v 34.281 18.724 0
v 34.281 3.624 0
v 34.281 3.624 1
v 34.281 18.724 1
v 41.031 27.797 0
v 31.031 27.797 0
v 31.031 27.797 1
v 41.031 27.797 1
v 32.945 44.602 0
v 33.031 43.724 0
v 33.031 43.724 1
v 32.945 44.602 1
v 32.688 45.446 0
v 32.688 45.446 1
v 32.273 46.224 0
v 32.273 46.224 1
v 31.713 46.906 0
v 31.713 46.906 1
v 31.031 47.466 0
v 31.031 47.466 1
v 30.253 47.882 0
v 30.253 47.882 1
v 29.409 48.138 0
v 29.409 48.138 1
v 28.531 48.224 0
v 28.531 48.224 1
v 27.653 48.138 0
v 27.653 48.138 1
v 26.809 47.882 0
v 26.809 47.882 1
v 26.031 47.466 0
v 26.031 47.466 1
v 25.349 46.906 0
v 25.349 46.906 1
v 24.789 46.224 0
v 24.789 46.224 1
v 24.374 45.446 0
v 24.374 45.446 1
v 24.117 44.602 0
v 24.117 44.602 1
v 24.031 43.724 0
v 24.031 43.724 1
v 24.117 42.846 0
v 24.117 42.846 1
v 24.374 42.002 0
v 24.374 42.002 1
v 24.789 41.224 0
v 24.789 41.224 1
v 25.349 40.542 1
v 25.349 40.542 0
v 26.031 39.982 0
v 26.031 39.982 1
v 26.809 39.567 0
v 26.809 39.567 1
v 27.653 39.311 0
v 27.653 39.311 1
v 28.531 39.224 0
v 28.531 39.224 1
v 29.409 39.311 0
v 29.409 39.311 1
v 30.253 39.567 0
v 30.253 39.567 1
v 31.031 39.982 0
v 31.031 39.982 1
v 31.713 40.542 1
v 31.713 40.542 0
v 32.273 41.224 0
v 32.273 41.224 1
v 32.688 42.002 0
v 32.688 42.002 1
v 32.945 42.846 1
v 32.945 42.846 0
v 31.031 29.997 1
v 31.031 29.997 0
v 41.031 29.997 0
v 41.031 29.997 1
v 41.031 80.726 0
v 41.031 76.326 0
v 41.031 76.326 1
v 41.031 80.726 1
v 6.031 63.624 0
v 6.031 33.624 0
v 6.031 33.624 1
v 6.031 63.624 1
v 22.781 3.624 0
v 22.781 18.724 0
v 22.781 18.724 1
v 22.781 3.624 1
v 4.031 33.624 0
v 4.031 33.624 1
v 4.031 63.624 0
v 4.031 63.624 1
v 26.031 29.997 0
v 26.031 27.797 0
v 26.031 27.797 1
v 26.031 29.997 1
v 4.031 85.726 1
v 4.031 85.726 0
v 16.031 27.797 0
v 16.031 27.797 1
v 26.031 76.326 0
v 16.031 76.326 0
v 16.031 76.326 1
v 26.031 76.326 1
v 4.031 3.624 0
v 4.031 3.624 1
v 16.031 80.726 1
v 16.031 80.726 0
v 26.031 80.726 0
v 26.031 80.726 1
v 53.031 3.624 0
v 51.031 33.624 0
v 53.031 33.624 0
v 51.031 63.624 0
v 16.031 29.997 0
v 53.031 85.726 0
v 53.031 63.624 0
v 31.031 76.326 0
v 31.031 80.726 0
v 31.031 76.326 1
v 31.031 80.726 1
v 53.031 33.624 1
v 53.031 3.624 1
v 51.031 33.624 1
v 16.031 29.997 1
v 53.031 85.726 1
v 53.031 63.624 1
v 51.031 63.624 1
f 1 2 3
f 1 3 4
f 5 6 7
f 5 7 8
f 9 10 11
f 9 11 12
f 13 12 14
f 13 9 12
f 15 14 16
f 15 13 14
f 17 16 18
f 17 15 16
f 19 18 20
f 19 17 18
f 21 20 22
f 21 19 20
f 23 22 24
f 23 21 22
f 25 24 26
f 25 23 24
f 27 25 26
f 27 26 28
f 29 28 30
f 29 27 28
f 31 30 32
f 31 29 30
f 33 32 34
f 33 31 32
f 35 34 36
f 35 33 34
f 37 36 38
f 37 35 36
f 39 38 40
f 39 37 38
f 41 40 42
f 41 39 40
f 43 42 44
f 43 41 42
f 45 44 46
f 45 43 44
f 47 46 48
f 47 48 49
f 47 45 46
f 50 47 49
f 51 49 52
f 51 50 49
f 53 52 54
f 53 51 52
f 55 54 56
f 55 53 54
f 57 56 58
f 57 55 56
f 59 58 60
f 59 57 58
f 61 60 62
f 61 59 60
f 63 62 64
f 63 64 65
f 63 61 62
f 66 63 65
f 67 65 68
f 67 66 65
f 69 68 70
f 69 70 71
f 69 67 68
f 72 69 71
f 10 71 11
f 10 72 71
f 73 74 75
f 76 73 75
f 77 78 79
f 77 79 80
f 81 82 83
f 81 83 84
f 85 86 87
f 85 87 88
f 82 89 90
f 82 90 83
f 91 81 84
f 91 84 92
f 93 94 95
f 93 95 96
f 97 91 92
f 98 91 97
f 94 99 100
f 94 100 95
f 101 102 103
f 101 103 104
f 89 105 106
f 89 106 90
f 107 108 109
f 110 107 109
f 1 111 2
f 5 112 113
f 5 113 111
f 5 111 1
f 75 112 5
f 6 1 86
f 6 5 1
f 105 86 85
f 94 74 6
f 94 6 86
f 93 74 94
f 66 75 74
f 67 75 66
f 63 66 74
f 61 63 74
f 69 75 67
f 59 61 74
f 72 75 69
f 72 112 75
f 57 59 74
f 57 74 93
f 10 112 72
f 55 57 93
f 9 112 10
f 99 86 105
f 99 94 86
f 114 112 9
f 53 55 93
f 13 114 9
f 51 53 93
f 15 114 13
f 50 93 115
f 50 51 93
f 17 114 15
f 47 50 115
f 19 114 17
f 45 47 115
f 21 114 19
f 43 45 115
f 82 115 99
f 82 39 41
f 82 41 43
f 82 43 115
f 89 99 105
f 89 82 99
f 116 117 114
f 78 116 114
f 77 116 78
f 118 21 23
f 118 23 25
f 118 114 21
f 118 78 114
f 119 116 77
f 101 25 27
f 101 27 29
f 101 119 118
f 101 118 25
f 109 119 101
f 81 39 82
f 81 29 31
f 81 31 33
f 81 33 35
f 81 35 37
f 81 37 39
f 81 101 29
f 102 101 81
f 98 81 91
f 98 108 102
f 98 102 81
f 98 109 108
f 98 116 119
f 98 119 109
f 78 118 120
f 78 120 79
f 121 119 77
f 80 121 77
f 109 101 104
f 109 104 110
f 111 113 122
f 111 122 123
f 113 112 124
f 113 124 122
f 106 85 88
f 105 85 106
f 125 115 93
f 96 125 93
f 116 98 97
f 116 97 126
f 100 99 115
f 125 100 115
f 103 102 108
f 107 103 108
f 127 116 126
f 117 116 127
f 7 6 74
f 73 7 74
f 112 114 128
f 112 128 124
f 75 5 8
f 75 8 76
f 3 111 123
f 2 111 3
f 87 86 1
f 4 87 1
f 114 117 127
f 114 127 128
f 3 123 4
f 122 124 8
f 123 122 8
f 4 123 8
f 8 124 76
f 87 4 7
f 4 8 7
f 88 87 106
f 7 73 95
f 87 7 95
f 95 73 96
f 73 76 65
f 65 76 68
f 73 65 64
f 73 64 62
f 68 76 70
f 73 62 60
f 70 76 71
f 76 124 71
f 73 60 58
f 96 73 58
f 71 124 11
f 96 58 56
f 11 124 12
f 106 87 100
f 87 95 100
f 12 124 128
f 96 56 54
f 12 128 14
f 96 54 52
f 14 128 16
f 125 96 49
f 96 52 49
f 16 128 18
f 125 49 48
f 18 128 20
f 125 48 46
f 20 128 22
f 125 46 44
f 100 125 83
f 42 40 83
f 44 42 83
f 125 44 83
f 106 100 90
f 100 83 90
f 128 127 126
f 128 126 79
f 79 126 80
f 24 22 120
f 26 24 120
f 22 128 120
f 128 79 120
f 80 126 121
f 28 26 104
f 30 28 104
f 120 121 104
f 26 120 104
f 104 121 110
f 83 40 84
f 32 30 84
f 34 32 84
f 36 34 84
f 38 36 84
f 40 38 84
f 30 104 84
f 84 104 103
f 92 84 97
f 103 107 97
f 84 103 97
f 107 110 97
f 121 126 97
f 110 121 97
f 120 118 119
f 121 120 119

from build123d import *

# Parameters (mm, degrees)
MODEL_R         = 4.5
MODEL_W         = 10
MODEL_H         = 4.4
MODEL_H_2       = 2.2
EXTRUDE_1_DEPTH = 1


with BuildPart() as part:
    # Model → 凸台-拉伸1 (new body)
    with BuildSketch(Plane.XY):
        Polygon((4.031012873, 85.725728146), (53.031012873, 85.725728146), (53.031012873, 63.624082732), (51.031012873, 63.624082732), (51.031012873, 33.624082732), (53.031012873, 33.624082732), (53.031012873, 3.624082732), (34.281012873, 3.624082732), (34.281012873, 18.724082732), (28.531012873, 18.724082732), (22.781012873, 18.724082732), (22.781012873, 3.624082732), (4.031012873, 3.624082732), (4.031012873, 33.624082732), (6.031012873, 33.624082732), (6.031012873, 63.624082732), (4.031012873, 63.624082732), align=None)
        with Locations((28.531012873, 43.724082732)):
            Circle(MODEL_R, mode=Mode.SUBTRACT)
        with Locations((36.031012873, 78.525728146)):
            Rectangle(MODEL_W, MODEL_H, mode=Mode.SUBTRACT)
        with Locations((21.031012873, 78.525728146)):
            Rectangle(MODEL_W, MODEL_H, mode=Mode.SUBTRACT)
        with Locations((21.031012873, 28.897146128)):
            Rectangle(MODEL_W, MODEL_H_2, mode=Mode.SUBTRACT)
        with Locations((36.031012873, 28.897146128)):
            Rectangle(MODEL_W, MODEL_H_2, mode=Mode.SUBTRACT)
    extrude(amount=EXTRUDE_1_DEPTH)


solid = part.part
